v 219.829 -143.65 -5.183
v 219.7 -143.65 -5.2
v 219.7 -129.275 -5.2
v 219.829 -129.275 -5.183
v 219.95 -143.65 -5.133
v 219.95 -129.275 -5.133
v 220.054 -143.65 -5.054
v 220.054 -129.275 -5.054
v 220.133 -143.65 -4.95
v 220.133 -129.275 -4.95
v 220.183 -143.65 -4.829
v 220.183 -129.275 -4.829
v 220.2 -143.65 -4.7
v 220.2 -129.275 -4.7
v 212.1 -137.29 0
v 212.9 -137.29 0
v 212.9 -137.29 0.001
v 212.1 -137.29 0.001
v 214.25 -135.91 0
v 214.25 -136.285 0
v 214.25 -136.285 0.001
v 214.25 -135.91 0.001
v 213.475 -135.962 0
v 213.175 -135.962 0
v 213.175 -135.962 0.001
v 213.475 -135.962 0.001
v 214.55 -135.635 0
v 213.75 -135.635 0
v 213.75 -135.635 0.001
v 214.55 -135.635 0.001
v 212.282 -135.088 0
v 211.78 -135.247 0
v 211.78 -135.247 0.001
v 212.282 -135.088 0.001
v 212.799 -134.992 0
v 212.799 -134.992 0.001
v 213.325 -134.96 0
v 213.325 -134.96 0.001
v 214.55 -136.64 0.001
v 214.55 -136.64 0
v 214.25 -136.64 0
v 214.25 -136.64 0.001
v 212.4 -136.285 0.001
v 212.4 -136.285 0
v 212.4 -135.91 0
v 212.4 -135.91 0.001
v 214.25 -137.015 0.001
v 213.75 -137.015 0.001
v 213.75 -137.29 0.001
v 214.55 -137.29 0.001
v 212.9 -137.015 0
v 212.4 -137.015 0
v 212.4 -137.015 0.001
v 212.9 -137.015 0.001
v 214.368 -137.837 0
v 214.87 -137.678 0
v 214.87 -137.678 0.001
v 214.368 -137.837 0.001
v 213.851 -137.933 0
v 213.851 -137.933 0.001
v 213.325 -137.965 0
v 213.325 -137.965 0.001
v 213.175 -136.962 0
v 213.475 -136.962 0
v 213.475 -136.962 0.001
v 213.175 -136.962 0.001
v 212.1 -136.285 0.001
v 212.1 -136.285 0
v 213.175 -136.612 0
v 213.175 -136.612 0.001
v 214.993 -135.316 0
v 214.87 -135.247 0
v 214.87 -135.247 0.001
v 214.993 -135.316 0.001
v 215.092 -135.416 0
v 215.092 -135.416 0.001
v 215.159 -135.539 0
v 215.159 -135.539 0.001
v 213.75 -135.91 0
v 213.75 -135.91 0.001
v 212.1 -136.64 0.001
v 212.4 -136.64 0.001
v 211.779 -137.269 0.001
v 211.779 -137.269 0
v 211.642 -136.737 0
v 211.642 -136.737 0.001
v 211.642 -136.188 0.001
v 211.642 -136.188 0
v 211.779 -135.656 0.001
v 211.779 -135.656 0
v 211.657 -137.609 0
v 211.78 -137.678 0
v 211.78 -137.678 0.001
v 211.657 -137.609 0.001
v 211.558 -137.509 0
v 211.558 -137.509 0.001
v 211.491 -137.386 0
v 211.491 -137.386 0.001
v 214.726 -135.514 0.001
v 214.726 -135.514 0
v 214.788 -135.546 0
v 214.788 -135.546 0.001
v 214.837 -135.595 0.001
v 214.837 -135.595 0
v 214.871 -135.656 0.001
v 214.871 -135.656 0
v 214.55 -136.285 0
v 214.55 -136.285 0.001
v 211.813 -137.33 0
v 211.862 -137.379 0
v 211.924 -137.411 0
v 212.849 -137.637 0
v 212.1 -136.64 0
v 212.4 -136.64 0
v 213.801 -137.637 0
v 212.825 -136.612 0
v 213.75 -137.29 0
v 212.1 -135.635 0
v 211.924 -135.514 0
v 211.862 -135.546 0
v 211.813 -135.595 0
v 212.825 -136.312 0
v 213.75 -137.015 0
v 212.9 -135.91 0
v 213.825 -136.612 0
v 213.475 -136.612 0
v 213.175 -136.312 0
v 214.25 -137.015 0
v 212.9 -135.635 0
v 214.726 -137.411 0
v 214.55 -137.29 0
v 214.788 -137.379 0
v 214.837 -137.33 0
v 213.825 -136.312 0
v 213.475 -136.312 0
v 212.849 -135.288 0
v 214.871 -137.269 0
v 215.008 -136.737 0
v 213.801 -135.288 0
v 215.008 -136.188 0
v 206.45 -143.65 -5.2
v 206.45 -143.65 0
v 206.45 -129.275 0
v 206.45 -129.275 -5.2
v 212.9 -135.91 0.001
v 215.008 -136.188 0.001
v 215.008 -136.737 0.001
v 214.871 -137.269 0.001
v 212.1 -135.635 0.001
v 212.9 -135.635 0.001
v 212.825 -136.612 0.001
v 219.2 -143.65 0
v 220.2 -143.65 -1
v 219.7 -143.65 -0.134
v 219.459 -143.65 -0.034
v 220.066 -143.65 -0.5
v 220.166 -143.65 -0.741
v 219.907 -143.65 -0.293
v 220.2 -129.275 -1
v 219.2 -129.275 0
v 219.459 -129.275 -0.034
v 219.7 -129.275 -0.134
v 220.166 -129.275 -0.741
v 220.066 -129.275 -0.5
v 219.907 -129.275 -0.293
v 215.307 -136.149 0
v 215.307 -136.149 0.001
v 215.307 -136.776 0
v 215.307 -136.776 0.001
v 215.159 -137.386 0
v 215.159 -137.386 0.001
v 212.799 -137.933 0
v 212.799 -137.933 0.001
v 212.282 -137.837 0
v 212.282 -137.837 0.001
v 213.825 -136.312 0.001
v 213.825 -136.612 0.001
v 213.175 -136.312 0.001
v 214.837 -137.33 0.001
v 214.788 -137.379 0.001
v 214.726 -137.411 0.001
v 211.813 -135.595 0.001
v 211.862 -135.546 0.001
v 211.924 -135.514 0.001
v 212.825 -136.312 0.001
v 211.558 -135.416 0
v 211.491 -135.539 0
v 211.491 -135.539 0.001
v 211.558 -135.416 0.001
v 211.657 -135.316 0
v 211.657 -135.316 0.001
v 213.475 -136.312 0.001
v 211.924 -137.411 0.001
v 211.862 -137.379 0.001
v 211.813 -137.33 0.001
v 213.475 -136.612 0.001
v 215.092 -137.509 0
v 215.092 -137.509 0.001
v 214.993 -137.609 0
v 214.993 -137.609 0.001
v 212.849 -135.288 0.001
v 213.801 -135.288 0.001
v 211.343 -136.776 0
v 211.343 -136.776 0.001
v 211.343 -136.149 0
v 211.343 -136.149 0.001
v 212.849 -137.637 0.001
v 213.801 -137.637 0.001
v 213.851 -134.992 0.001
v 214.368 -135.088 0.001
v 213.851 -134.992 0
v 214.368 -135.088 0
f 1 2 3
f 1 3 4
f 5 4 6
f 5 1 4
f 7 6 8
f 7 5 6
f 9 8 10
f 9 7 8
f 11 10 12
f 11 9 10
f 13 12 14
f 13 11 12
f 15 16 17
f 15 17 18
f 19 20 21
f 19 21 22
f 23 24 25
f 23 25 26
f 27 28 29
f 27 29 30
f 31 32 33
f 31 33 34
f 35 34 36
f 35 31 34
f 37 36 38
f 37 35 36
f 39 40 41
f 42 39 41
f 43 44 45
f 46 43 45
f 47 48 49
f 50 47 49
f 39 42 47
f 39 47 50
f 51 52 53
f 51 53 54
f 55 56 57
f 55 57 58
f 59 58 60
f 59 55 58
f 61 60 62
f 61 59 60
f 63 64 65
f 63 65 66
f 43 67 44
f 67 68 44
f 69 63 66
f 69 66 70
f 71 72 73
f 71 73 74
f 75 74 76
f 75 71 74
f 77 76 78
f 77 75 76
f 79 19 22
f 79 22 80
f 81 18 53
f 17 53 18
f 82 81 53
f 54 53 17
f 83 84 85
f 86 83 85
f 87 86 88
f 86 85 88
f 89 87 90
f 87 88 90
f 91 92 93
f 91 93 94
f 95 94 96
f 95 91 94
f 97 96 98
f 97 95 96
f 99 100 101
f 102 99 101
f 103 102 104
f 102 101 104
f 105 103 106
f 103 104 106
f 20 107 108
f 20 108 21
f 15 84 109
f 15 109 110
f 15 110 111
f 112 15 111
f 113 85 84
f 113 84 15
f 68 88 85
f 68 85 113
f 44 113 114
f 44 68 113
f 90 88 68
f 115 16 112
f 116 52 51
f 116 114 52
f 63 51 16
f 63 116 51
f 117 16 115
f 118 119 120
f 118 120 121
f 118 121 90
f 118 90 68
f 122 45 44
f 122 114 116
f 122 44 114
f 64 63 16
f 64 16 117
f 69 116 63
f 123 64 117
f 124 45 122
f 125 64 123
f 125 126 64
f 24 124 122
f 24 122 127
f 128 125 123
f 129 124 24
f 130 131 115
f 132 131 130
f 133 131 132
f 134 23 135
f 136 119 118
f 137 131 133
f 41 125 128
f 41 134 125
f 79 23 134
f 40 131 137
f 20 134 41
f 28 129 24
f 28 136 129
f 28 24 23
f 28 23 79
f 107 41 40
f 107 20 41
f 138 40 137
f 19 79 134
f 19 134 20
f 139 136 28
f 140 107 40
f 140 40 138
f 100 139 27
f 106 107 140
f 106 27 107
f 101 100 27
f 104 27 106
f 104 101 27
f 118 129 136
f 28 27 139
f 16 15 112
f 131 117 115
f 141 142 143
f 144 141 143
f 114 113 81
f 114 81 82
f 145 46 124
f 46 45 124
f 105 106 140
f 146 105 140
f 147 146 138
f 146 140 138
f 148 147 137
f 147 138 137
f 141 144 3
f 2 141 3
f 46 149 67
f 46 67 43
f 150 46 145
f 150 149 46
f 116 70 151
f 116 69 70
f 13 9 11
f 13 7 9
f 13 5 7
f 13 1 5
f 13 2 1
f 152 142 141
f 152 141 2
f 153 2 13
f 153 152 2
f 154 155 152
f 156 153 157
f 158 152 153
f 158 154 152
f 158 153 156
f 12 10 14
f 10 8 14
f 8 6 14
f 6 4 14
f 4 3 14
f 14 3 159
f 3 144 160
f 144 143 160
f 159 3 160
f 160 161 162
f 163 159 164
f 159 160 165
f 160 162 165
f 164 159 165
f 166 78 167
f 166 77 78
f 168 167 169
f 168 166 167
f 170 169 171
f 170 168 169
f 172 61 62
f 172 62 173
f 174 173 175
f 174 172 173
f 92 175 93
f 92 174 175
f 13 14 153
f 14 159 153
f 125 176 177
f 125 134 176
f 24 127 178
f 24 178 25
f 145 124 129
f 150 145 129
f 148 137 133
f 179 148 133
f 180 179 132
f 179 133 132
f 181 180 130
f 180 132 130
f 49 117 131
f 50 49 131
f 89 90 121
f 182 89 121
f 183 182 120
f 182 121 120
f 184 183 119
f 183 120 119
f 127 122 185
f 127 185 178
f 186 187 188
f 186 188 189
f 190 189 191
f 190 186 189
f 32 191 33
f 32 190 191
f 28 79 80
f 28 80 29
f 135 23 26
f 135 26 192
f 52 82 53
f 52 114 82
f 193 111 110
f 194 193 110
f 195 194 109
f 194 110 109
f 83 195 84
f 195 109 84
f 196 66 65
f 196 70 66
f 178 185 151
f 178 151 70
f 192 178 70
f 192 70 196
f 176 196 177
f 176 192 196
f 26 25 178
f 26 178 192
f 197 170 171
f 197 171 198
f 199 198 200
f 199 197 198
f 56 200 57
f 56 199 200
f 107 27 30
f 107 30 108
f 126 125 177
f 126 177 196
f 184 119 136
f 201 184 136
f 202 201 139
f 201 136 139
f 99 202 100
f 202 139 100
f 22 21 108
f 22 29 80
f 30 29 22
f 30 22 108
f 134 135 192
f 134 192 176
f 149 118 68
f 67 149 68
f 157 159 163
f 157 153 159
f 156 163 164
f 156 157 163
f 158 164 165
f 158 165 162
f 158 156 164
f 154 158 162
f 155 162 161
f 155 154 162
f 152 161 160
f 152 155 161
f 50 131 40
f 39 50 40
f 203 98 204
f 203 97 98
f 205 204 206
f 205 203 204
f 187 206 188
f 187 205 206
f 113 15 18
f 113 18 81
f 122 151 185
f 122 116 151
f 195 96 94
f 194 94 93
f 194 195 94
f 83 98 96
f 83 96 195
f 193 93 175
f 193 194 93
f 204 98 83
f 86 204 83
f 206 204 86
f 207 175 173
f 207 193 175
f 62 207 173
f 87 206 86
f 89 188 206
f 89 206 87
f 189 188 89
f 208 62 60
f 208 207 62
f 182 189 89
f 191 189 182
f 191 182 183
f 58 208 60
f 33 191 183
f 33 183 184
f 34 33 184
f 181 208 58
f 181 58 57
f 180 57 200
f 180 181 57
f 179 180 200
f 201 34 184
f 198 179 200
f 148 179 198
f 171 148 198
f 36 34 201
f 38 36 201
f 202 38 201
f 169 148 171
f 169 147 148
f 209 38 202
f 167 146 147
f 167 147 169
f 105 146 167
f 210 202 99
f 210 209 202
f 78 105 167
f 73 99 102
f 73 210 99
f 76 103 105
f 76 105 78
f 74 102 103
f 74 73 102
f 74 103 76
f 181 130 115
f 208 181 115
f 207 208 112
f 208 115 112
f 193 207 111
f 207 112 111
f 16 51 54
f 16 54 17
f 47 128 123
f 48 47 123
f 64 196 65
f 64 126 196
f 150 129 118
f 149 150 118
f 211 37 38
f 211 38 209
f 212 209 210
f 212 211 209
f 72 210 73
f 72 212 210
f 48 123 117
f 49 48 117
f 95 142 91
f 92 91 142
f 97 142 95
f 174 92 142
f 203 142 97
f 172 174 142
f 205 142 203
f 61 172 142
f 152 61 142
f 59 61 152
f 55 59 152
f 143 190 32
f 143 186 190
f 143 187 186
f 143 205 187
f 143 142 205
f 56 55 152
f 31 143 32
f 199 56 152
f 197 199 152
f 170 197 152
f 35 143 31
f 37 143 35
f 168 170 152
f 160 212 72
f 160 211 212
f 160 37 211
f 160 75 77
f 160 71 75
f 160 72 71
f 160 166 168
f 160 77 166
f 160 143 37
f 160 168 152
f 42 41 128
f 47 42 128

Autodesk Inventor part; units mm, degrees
ref_plane "YZ Plane" through (0, 0, 0) normal (1, 0, 0) x (0, 1, 0)
ref_plane "XZ Plane" through (0, 0, 0) normal (0, 1, 0) x (-1, 0, 0)
ref_plane "XY Plane" through (0, 0, 0) normal (0, 0, 1) x (1, 0, 0)
sketch "Szkic1" plane through (0, 0, 0) normal (0, 0, 1) x (1, 0, 0)
  line L0 (206.45, -143.65) -> (206.45, -129.275)
  line L1 (206.45, -129.275) -> (220.2, -129.275)
  line L2 (206.45, -143.65) -> (220.2, -143.65)
  line L3 (220.2, -129.275) -> (220.2, -143.65)
extrude "Wyciągnięcie proste1" add sketch "Szkic1" against normal blind 5.2
fillet "Zaokrąglenie1" radius 0.5 1 edges at (220.2, -136.4625, -5.2)
sketch "Szkic6" plane through (0, 0, 0) normal (0, 0, 1) x (1, 0, 0)
  line L0 (213.825, -136.3125) -> (213.825, -136.6125)
  line L1 (212.825, -136.6125) -> (212.825, -136.3125)
  line L2 (213.175, -135.9625) -> (213.475, -135.9625)
  line L3 (213.475, -136.9625) -> (213.175, -136.9625)
  line L4 (213.825, -136.6125) -> (213.475, -136.6125)
  line L5 (213.175, -136.6125) -> (212.825, -136.6125)
  line L6 (213.175, -136.9625) -> (213.175, -136.6125)
  line L7 (213.175, -136.3125) -> (213.175, -135.9625)
  line L8 (213.475, -135.9625) -> (213.475, -136.3125)
  line L9 (213.475, -136.6125) -> (213.475, -136.9625)
  line L10 (212.825, -136.3125) -> (213.175, -136.3125)
  line L11 (213.475, -136.3125) -> (213.825, -136.3125)
  line L12 (212.9, -137.2903) -> (212.1, -137.2903)
  line L13 (212.1, -137.2903) -> (212.1, -136.6403)
  line L14 (212.1, -136.6403) -> (212.4, -136.6403)
  line L15 (212.4, -136.6403) -> (212.4, -137.0153)
  line L16 (212.4, -137.0153) -> (212.9, -137.0153)
  line L17 (212.9, -137.0153) -> (212.9, -137.2903)
  line L18 (213.75, -137.2903) -> (214.55, -137.2903)
  line L19 (214.55, -137.2903) -> (214.55, -136.6403)
  line L20 (214.55, -136.6403) -> (214.25, -136.6403)
  line L21 (214.25, -136.6403) -> (214.25, -137.0153)
  line L22 (214.25, -137.0153) -> (213.75, -137.0153)
  line L23 (213.75, -137.0153) -> (213.75, -137.2903)
  line L24 (212.9, -135.6347) -> (212.1, -135.6347)
  line L25 (212.1, -135.6347) -> (212.1, -136.2847)
  line L26 (212.1, -136.2847) -> (212.4, -136.2847)
  line L27 (212.4, -136.2847) -> (212.4, -135.9097)
  line L28 (212.4, -135.9097) -> (212.9, -135.9097)
  line L29 (212.9, -135.9097) -> (212.9, -135.6347)
  line L30 (213.75, -135.9097) -> (213.75, -135.6347)
  line L31 (214.25, -136.2847) -> (214.25, -135.9097)
  line L32 (214.25, -135.9097) -> (213.75, -135.9097)
  line L33 (214.55, -136.2847) -> (214.25, -136.2847)
  line L34 (214.55, -135.6347) -> (214.55, -136.2847)
  line L35 (213.75, -135.6347) -> (214.55, -135.6347)
  arc A0 (211.7792, -135.6557) -> (211.7792, -137.2693) centre (213.8094, -136.4625) ccw
  arc A1 (214.7263, -135.514) -> (211.9237, -135.514) centre (213.325, -139.2478) ccw
  arc A2 (211.9237, -137.411) -> (214.7263, -137.411) centre (213.325, -133.6772) ccw
  arc A3 (214.8708, -137.2693) -> (214.8708, -135.6557) centre (212.8406, -136.4625) ccw
  arc A4 (215.1708, -137.2693) -> (215.1708, -135.6557) centre (213.1406, -136.4625) ccw
  arc A5 (215.1776, -135.6727) -> (214.7263, -135.214) centre (214.4204, -135.9663) ccw
  arc A6 (214.7263, -137.711) -> (215.1776, -137.2523) centre (214.4204, -136.9587) ccw
  arc A7 (211.9237, -135.514) -> (211.7792, -135.6557) centre (212.0023, -135.7386) ccw
  arc A8 (211.7792, -137.2693) -> (211.9237, -137.411) centre (212.0023, -137.1864) ccw
  arc A9 (214.8708, -135.6557) -> (214.7263, -135.514) centre (214.6477, -135.7386) ccw
  arc A10 (214.7263, -137.411) -> (214.8708, -137.2693) centre (214.6477, -137.1864) ccw
  arc A11 (211.4912, -135.5391) -> (211.4912, -137.3859) centre (213.9698, -136.4625) ccw
  arc A12 (213.325, -134.9597) -> (211.7797, -135.2472) centre (213.3235, -139.2481) ccw
  arc A13 (211.7797, -135.2472) -> (211.4912, -135.5391) centre (211.9597, -135.7137) ccw
  arc A14 (211.7797, -137.6778) -> (213.325, -137.9653) centre (213.3235, -133.6769) ccw
  arc A15 (211.4912, -137.3859) -> (211.7797, -137.6778) centre (211.9597, -137.2113) ccw
  arc A16 (215.1588, -137.3859) -> (215.1588, -135.5391) centre (212.6802, -136.4625) ccw
  arc A17 (214.8703, -135.2472) -> (213.325, -134.9597) centre (213.3265, -139.2481) ccw
  arc A18 (215.1588, -135.5391) -> (214.8703, -135.2472) centre (214.6903, -135.7137) ccw
  arc A19 (213.325, -137.9653) -> (214.8703, -137.6778) centre (213.3265, -133.6769) ccw
  arc A20 (214.8703, -137.6778) -> (215.1588, -137.3859) centre (214.6903, -137.2113) ccw
  point P0 (213.325, -136.4625)
  dimension "d56" = 0.3
  dimension "d63" = 0.65
  dimension "d64" = 0.3
  dimension "d66" = 0.375
  dimension "d68" = 0.5
fillet "Zaokrąglenie2" radius 1 1 edges at (220.2, -136.4625, 0)
extrude "Wyciągnięcie proste5" add sketch "Szkic6" along normal blind 0.001
properties part number "PRZYCISK IO" material "Tworzywo sztuczne, nieprzezroczyste czarne"
